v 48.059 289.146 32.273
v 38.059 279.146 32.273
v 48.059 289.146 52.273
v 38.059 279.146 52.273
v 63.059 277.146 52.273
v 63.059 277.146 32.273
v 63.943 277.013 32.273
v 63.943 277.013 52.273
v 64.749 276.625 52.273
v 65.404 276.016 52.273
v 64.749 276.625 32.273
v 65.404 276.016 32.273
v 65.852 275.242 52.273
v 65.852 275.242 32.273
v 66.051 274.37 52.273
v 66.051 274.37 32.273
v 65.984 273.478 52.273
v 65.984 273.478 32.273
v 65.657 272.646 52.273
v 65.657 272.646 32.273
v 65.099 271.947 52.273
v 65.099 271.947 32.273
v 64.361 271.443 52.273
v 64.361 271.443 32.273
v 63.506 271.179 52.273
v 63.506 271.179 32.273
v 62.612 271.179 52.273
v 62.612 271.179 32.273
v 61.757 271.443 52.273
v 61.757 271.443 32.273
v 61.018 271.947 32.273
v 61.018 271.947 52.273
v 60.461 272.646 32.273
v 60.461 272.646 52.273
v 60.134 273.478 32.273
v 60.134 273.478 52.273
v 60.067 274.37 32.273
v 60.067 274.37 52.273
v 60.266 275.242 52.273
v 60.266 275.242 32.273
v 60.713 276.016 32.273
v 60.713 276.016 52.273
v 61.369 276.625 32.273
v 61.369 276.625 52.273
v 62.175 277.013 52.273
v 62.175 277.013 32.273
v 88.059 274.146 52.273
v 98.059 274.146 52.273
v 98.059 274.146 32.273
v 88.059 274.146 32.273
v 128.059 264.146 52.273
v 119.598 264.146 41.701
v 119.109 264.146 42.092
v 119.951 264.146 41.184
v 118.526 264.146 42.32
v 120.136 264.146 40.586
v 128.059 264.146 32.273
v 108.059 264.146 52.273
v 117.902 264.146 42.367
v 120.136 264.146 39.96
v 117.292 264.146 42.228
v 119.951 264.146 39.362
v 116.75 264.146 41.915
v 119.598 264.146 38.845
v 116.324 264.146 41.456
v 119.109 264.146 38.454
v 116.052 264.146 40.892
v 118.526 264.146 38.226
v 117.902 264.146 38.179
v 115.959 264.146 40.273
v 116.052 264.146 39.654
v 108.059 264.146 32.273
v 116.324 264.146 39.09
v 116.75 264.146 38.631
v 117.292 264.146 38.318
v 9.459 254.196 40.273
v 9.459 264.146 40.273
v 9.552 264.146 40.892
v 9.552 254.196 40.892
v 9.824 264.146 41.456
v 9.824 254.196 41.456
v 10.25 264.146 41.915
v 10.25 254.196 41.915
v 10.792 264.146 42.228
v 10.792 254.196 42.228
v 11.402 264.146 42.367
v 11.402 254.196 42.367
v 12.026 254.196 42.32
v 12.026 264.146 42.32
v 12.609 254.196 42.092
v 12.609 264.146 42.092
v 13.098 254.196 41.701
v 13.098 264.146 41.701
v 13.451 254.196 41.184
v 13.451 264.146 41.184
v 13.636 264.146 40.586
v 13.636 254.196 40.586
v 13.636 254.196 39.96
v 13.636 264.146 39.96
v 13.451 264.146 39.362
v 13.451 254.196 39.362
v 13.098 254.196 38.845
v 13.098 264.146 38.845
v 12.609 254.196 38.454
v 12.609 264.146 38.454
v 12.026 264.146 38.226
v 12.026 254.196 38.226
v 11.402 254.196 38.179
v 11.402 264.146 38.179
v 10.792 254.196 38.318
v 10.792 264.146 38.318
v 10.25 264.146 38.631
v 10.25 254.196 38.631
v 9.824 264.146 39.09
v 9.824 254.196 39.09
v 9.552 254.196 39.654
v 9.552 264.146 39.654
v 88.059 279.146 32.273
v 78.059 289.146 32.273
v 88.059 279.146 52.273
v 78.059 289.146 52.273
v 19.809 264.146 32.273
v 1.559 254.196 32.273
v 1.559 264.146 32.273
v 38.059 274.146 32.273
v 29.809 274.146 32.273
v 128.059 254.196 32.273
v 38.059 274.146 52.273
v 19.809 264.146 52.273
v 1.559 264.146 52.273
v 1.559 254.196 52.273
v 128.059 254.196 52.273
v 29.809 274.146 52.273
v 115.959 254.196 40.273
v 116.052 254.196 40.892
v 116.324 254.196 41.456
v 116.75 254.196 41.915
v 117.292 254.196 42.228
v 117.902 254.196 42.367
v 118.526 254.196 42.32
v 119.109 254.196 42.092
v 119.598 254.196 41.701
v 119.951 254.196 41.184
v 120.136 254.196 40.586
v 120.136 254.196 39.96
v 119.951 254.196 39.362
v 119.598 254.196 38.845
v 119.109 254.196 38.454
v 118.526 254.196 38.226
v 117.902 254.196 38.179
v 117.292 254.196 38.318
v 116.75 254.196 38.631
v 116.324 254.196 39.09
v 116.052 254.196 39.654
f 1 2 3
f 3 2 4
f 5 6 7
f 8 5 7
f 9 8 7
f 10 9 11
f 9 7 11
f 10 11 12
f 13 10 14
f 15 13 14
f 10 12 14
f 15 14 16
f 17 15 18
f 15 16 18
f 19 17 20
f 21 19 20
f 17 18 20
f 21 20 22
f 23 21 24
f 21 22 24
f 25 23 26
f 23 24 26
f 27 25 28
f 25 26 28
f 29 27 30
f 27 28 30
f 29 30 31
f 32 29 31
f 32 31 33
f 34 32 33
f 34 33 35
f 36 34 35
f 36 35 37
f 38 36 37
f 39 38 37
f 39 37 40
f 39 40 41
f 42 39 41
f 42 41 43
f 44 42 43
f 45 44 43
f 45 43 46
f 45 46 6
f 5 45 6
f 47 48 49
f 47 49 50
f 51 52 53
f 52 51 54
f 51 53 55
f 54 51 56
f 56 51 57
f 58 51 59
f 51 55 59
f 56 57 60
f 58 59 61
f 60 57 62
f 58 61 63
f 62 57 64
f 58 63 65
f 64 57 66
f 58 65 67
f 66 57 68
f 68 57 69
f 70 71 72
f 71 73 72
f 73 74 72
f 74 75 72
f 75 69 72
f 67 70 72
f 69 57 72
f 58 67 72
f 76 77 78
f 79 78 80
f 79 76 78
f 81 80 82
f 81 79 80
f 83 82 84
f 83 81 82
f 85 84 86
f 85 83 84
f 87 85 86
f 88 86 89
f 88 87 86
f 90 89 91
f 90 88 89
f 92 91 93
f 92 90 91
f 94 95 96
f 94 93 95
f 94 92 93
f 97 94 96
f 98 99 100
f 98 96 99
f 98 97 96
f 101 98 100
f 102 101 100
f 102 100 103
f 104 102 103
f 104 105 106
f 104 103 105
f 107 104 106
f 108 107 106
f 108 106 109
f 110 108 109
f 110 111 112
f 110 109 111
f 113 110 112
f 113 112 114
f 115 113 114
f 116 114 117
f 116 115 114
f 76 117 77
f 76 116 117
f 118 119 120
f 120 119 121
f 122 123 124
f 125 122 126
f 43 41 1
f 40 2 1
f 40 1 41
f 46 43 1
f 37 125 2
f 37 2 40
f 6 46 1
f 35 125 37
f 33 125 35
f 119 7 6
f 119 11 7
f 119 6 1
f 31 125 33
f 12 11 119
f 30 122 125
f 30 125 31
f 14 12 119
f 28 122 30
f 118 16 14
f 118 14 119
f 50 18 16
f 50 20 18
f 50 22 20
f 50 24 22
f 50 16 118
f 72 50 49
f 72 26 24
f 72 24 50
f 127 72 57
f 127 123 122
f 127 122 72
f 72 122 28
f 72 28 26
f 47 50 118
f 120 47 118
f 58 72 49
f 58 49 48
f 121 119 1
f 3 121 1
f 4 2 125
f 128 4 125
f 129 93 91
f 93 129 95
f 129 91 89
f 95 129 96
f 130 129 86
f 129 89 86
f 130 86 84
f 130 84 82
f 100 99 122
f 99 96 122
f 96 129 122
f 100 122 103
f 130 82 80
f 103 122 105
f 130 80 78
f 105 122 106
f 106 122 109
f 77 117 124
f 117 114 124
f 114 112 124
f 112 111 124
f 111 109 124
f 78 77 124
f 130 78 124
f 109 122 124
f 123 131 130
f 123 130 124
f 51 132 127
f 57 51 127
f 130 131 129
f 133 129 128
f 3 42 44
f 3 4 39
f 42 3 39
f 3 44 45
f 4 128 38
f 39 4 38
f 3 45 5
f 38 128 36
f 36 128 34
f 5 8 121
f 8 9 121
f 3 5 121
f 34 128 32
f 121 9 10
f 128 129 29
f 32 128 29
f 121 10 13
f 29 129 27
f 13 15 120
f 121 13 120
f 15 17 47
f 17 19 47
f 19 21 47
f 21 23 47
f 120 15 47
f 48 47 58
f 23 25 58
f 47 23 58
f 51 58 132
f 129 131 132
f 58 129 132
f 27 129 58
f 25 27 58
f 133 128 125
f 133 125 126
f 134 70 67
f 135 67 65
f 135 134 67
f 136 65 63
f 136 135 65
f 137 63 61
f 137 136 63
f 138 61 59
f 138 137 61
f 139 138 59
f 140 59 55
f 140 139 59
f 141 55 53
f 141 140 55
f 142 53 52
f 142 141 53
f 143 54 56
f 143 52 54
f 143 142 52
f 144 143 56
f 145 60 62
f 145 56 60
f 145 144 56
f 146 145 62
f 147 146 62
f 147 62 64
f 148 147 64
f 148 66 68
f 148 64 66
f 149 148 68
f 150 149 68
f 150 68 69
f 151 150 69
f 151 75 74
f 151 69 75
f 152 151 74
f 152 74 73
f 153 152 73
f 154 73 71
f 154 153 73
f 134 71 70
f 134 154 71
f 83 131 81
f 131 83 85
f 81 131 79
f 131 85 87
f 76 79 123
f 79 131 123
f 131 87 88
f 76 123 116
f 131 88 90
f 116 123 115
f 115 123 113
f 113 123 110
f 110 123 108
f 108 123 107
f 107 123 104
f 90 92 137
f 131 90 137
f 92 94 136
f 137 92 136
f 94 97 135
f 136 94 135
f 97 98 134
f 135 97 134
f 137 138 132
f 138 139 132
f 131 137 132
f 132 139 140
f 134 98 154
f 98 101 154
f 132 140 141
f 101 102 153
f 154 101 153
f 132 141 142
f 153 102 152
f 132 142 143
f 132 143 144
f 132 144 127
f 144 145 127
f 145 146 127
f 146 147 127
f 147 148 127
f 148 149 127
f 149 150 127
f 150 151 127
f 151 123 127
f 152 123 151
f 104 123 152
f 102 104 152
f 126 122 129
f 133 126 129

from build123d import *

# Parameters (mm, degrees)
SKETCH_1_W          = 126.5
SKETCH_1_H          = 20
SKETCH_1_R          = 2.1
EXTRUDE_1_DEPTH     = 40
SKETCH_2_R          = 3
CUT_EXTRUDE_1_DEPTH = 322.481529503
CHAMFER_1_SIZE      = 10
CHAMFER_2_SIZE      = 10


with BuildPart() as part:
    # Эскиз1 → Бобышка-Вытянуть1 (new body)
    with BuildSketch(Plane(origin=(0, 254.195974268, 0), x_dir=(1, 0, 0), z_dir=(0, 1, 0))):
        with Locations((64.808980694, -42.273129836)):
            Rectangle(SKETCH_1_W, SKETCH_1_H)
        with Locations(Location((11.55898069, -40.273129836, 0), (0, 0, 180))):
            Circle(SKETCH_1_R, mode=Mode.SUBTRACT)
        with Locations(Location((118.058980694, -40.273129836, 0), (0, 0, 180))):
            Circle(SKETCH_1_R, mode=Mode.SUBTRACT)
    extrude(amount=EXTRUDE_1_DEPTH)

    # Эскиз2 → Вырез-Вытянуть1 (cut, through all)
    with BuildSketch(Plane(origin=(0, 0, 32.273129836), x_dir=(-1, 0, 0), z_dir=(0, 0, -1))):
        with Locations(Location((-63.058980694, 274.145974268, 0), (0, 0, 90))):
            Circle(SKETCH_2_R)
        Polygon((-128.058980694, 294.195974268), (-128.058980694, 274.195974268), (-128.058980694, 264.145974268), (-108.058980694, 264.145974268), (-108.058980694, 274.145974268), (-88.058980694, 274.145974268), (-88.058980694, 289.145974268), (-38.058980694, 289.145974268), (-38.058980694, 274.145974268), (-19.808980694, 274.145974268), (-19.808980694, 264.145974268), (-1.558980694, 264.145974268), (-1.558980694, 274.195974268), (-1.558980694, 294.195974268), align=None)
    extrude(amount=-CUT_EXTRUDE_1_DEPTH, mode=Mode.SUBTRACT)

    # Фаска1
    chamfer_1_edges = [part.edges().sort_by_distance(p)[0] for p in [
        (38.058980694, 289.145974268, 42.273129836),
        (88.058980694, 289.145974268, 42.273129836),
    ]]
    chamfer(chamfer_1_edges, length=CHAMFER_1_SIZE)

    # Фаска2
    chamfer_2_edges = [part.edges().sort_by_distance(p)[0] for p in [
        (19.808980694, 274.145974268, 42.273129836),
        (108.058980694, 274.145974268, 42.273129836),
    ]]
    chamfer(chamfer_2_edges, length=CHAMFER_2_SIZE - 0.0001)  # a hair under: the kernel refuses the full size


solid = part.part
